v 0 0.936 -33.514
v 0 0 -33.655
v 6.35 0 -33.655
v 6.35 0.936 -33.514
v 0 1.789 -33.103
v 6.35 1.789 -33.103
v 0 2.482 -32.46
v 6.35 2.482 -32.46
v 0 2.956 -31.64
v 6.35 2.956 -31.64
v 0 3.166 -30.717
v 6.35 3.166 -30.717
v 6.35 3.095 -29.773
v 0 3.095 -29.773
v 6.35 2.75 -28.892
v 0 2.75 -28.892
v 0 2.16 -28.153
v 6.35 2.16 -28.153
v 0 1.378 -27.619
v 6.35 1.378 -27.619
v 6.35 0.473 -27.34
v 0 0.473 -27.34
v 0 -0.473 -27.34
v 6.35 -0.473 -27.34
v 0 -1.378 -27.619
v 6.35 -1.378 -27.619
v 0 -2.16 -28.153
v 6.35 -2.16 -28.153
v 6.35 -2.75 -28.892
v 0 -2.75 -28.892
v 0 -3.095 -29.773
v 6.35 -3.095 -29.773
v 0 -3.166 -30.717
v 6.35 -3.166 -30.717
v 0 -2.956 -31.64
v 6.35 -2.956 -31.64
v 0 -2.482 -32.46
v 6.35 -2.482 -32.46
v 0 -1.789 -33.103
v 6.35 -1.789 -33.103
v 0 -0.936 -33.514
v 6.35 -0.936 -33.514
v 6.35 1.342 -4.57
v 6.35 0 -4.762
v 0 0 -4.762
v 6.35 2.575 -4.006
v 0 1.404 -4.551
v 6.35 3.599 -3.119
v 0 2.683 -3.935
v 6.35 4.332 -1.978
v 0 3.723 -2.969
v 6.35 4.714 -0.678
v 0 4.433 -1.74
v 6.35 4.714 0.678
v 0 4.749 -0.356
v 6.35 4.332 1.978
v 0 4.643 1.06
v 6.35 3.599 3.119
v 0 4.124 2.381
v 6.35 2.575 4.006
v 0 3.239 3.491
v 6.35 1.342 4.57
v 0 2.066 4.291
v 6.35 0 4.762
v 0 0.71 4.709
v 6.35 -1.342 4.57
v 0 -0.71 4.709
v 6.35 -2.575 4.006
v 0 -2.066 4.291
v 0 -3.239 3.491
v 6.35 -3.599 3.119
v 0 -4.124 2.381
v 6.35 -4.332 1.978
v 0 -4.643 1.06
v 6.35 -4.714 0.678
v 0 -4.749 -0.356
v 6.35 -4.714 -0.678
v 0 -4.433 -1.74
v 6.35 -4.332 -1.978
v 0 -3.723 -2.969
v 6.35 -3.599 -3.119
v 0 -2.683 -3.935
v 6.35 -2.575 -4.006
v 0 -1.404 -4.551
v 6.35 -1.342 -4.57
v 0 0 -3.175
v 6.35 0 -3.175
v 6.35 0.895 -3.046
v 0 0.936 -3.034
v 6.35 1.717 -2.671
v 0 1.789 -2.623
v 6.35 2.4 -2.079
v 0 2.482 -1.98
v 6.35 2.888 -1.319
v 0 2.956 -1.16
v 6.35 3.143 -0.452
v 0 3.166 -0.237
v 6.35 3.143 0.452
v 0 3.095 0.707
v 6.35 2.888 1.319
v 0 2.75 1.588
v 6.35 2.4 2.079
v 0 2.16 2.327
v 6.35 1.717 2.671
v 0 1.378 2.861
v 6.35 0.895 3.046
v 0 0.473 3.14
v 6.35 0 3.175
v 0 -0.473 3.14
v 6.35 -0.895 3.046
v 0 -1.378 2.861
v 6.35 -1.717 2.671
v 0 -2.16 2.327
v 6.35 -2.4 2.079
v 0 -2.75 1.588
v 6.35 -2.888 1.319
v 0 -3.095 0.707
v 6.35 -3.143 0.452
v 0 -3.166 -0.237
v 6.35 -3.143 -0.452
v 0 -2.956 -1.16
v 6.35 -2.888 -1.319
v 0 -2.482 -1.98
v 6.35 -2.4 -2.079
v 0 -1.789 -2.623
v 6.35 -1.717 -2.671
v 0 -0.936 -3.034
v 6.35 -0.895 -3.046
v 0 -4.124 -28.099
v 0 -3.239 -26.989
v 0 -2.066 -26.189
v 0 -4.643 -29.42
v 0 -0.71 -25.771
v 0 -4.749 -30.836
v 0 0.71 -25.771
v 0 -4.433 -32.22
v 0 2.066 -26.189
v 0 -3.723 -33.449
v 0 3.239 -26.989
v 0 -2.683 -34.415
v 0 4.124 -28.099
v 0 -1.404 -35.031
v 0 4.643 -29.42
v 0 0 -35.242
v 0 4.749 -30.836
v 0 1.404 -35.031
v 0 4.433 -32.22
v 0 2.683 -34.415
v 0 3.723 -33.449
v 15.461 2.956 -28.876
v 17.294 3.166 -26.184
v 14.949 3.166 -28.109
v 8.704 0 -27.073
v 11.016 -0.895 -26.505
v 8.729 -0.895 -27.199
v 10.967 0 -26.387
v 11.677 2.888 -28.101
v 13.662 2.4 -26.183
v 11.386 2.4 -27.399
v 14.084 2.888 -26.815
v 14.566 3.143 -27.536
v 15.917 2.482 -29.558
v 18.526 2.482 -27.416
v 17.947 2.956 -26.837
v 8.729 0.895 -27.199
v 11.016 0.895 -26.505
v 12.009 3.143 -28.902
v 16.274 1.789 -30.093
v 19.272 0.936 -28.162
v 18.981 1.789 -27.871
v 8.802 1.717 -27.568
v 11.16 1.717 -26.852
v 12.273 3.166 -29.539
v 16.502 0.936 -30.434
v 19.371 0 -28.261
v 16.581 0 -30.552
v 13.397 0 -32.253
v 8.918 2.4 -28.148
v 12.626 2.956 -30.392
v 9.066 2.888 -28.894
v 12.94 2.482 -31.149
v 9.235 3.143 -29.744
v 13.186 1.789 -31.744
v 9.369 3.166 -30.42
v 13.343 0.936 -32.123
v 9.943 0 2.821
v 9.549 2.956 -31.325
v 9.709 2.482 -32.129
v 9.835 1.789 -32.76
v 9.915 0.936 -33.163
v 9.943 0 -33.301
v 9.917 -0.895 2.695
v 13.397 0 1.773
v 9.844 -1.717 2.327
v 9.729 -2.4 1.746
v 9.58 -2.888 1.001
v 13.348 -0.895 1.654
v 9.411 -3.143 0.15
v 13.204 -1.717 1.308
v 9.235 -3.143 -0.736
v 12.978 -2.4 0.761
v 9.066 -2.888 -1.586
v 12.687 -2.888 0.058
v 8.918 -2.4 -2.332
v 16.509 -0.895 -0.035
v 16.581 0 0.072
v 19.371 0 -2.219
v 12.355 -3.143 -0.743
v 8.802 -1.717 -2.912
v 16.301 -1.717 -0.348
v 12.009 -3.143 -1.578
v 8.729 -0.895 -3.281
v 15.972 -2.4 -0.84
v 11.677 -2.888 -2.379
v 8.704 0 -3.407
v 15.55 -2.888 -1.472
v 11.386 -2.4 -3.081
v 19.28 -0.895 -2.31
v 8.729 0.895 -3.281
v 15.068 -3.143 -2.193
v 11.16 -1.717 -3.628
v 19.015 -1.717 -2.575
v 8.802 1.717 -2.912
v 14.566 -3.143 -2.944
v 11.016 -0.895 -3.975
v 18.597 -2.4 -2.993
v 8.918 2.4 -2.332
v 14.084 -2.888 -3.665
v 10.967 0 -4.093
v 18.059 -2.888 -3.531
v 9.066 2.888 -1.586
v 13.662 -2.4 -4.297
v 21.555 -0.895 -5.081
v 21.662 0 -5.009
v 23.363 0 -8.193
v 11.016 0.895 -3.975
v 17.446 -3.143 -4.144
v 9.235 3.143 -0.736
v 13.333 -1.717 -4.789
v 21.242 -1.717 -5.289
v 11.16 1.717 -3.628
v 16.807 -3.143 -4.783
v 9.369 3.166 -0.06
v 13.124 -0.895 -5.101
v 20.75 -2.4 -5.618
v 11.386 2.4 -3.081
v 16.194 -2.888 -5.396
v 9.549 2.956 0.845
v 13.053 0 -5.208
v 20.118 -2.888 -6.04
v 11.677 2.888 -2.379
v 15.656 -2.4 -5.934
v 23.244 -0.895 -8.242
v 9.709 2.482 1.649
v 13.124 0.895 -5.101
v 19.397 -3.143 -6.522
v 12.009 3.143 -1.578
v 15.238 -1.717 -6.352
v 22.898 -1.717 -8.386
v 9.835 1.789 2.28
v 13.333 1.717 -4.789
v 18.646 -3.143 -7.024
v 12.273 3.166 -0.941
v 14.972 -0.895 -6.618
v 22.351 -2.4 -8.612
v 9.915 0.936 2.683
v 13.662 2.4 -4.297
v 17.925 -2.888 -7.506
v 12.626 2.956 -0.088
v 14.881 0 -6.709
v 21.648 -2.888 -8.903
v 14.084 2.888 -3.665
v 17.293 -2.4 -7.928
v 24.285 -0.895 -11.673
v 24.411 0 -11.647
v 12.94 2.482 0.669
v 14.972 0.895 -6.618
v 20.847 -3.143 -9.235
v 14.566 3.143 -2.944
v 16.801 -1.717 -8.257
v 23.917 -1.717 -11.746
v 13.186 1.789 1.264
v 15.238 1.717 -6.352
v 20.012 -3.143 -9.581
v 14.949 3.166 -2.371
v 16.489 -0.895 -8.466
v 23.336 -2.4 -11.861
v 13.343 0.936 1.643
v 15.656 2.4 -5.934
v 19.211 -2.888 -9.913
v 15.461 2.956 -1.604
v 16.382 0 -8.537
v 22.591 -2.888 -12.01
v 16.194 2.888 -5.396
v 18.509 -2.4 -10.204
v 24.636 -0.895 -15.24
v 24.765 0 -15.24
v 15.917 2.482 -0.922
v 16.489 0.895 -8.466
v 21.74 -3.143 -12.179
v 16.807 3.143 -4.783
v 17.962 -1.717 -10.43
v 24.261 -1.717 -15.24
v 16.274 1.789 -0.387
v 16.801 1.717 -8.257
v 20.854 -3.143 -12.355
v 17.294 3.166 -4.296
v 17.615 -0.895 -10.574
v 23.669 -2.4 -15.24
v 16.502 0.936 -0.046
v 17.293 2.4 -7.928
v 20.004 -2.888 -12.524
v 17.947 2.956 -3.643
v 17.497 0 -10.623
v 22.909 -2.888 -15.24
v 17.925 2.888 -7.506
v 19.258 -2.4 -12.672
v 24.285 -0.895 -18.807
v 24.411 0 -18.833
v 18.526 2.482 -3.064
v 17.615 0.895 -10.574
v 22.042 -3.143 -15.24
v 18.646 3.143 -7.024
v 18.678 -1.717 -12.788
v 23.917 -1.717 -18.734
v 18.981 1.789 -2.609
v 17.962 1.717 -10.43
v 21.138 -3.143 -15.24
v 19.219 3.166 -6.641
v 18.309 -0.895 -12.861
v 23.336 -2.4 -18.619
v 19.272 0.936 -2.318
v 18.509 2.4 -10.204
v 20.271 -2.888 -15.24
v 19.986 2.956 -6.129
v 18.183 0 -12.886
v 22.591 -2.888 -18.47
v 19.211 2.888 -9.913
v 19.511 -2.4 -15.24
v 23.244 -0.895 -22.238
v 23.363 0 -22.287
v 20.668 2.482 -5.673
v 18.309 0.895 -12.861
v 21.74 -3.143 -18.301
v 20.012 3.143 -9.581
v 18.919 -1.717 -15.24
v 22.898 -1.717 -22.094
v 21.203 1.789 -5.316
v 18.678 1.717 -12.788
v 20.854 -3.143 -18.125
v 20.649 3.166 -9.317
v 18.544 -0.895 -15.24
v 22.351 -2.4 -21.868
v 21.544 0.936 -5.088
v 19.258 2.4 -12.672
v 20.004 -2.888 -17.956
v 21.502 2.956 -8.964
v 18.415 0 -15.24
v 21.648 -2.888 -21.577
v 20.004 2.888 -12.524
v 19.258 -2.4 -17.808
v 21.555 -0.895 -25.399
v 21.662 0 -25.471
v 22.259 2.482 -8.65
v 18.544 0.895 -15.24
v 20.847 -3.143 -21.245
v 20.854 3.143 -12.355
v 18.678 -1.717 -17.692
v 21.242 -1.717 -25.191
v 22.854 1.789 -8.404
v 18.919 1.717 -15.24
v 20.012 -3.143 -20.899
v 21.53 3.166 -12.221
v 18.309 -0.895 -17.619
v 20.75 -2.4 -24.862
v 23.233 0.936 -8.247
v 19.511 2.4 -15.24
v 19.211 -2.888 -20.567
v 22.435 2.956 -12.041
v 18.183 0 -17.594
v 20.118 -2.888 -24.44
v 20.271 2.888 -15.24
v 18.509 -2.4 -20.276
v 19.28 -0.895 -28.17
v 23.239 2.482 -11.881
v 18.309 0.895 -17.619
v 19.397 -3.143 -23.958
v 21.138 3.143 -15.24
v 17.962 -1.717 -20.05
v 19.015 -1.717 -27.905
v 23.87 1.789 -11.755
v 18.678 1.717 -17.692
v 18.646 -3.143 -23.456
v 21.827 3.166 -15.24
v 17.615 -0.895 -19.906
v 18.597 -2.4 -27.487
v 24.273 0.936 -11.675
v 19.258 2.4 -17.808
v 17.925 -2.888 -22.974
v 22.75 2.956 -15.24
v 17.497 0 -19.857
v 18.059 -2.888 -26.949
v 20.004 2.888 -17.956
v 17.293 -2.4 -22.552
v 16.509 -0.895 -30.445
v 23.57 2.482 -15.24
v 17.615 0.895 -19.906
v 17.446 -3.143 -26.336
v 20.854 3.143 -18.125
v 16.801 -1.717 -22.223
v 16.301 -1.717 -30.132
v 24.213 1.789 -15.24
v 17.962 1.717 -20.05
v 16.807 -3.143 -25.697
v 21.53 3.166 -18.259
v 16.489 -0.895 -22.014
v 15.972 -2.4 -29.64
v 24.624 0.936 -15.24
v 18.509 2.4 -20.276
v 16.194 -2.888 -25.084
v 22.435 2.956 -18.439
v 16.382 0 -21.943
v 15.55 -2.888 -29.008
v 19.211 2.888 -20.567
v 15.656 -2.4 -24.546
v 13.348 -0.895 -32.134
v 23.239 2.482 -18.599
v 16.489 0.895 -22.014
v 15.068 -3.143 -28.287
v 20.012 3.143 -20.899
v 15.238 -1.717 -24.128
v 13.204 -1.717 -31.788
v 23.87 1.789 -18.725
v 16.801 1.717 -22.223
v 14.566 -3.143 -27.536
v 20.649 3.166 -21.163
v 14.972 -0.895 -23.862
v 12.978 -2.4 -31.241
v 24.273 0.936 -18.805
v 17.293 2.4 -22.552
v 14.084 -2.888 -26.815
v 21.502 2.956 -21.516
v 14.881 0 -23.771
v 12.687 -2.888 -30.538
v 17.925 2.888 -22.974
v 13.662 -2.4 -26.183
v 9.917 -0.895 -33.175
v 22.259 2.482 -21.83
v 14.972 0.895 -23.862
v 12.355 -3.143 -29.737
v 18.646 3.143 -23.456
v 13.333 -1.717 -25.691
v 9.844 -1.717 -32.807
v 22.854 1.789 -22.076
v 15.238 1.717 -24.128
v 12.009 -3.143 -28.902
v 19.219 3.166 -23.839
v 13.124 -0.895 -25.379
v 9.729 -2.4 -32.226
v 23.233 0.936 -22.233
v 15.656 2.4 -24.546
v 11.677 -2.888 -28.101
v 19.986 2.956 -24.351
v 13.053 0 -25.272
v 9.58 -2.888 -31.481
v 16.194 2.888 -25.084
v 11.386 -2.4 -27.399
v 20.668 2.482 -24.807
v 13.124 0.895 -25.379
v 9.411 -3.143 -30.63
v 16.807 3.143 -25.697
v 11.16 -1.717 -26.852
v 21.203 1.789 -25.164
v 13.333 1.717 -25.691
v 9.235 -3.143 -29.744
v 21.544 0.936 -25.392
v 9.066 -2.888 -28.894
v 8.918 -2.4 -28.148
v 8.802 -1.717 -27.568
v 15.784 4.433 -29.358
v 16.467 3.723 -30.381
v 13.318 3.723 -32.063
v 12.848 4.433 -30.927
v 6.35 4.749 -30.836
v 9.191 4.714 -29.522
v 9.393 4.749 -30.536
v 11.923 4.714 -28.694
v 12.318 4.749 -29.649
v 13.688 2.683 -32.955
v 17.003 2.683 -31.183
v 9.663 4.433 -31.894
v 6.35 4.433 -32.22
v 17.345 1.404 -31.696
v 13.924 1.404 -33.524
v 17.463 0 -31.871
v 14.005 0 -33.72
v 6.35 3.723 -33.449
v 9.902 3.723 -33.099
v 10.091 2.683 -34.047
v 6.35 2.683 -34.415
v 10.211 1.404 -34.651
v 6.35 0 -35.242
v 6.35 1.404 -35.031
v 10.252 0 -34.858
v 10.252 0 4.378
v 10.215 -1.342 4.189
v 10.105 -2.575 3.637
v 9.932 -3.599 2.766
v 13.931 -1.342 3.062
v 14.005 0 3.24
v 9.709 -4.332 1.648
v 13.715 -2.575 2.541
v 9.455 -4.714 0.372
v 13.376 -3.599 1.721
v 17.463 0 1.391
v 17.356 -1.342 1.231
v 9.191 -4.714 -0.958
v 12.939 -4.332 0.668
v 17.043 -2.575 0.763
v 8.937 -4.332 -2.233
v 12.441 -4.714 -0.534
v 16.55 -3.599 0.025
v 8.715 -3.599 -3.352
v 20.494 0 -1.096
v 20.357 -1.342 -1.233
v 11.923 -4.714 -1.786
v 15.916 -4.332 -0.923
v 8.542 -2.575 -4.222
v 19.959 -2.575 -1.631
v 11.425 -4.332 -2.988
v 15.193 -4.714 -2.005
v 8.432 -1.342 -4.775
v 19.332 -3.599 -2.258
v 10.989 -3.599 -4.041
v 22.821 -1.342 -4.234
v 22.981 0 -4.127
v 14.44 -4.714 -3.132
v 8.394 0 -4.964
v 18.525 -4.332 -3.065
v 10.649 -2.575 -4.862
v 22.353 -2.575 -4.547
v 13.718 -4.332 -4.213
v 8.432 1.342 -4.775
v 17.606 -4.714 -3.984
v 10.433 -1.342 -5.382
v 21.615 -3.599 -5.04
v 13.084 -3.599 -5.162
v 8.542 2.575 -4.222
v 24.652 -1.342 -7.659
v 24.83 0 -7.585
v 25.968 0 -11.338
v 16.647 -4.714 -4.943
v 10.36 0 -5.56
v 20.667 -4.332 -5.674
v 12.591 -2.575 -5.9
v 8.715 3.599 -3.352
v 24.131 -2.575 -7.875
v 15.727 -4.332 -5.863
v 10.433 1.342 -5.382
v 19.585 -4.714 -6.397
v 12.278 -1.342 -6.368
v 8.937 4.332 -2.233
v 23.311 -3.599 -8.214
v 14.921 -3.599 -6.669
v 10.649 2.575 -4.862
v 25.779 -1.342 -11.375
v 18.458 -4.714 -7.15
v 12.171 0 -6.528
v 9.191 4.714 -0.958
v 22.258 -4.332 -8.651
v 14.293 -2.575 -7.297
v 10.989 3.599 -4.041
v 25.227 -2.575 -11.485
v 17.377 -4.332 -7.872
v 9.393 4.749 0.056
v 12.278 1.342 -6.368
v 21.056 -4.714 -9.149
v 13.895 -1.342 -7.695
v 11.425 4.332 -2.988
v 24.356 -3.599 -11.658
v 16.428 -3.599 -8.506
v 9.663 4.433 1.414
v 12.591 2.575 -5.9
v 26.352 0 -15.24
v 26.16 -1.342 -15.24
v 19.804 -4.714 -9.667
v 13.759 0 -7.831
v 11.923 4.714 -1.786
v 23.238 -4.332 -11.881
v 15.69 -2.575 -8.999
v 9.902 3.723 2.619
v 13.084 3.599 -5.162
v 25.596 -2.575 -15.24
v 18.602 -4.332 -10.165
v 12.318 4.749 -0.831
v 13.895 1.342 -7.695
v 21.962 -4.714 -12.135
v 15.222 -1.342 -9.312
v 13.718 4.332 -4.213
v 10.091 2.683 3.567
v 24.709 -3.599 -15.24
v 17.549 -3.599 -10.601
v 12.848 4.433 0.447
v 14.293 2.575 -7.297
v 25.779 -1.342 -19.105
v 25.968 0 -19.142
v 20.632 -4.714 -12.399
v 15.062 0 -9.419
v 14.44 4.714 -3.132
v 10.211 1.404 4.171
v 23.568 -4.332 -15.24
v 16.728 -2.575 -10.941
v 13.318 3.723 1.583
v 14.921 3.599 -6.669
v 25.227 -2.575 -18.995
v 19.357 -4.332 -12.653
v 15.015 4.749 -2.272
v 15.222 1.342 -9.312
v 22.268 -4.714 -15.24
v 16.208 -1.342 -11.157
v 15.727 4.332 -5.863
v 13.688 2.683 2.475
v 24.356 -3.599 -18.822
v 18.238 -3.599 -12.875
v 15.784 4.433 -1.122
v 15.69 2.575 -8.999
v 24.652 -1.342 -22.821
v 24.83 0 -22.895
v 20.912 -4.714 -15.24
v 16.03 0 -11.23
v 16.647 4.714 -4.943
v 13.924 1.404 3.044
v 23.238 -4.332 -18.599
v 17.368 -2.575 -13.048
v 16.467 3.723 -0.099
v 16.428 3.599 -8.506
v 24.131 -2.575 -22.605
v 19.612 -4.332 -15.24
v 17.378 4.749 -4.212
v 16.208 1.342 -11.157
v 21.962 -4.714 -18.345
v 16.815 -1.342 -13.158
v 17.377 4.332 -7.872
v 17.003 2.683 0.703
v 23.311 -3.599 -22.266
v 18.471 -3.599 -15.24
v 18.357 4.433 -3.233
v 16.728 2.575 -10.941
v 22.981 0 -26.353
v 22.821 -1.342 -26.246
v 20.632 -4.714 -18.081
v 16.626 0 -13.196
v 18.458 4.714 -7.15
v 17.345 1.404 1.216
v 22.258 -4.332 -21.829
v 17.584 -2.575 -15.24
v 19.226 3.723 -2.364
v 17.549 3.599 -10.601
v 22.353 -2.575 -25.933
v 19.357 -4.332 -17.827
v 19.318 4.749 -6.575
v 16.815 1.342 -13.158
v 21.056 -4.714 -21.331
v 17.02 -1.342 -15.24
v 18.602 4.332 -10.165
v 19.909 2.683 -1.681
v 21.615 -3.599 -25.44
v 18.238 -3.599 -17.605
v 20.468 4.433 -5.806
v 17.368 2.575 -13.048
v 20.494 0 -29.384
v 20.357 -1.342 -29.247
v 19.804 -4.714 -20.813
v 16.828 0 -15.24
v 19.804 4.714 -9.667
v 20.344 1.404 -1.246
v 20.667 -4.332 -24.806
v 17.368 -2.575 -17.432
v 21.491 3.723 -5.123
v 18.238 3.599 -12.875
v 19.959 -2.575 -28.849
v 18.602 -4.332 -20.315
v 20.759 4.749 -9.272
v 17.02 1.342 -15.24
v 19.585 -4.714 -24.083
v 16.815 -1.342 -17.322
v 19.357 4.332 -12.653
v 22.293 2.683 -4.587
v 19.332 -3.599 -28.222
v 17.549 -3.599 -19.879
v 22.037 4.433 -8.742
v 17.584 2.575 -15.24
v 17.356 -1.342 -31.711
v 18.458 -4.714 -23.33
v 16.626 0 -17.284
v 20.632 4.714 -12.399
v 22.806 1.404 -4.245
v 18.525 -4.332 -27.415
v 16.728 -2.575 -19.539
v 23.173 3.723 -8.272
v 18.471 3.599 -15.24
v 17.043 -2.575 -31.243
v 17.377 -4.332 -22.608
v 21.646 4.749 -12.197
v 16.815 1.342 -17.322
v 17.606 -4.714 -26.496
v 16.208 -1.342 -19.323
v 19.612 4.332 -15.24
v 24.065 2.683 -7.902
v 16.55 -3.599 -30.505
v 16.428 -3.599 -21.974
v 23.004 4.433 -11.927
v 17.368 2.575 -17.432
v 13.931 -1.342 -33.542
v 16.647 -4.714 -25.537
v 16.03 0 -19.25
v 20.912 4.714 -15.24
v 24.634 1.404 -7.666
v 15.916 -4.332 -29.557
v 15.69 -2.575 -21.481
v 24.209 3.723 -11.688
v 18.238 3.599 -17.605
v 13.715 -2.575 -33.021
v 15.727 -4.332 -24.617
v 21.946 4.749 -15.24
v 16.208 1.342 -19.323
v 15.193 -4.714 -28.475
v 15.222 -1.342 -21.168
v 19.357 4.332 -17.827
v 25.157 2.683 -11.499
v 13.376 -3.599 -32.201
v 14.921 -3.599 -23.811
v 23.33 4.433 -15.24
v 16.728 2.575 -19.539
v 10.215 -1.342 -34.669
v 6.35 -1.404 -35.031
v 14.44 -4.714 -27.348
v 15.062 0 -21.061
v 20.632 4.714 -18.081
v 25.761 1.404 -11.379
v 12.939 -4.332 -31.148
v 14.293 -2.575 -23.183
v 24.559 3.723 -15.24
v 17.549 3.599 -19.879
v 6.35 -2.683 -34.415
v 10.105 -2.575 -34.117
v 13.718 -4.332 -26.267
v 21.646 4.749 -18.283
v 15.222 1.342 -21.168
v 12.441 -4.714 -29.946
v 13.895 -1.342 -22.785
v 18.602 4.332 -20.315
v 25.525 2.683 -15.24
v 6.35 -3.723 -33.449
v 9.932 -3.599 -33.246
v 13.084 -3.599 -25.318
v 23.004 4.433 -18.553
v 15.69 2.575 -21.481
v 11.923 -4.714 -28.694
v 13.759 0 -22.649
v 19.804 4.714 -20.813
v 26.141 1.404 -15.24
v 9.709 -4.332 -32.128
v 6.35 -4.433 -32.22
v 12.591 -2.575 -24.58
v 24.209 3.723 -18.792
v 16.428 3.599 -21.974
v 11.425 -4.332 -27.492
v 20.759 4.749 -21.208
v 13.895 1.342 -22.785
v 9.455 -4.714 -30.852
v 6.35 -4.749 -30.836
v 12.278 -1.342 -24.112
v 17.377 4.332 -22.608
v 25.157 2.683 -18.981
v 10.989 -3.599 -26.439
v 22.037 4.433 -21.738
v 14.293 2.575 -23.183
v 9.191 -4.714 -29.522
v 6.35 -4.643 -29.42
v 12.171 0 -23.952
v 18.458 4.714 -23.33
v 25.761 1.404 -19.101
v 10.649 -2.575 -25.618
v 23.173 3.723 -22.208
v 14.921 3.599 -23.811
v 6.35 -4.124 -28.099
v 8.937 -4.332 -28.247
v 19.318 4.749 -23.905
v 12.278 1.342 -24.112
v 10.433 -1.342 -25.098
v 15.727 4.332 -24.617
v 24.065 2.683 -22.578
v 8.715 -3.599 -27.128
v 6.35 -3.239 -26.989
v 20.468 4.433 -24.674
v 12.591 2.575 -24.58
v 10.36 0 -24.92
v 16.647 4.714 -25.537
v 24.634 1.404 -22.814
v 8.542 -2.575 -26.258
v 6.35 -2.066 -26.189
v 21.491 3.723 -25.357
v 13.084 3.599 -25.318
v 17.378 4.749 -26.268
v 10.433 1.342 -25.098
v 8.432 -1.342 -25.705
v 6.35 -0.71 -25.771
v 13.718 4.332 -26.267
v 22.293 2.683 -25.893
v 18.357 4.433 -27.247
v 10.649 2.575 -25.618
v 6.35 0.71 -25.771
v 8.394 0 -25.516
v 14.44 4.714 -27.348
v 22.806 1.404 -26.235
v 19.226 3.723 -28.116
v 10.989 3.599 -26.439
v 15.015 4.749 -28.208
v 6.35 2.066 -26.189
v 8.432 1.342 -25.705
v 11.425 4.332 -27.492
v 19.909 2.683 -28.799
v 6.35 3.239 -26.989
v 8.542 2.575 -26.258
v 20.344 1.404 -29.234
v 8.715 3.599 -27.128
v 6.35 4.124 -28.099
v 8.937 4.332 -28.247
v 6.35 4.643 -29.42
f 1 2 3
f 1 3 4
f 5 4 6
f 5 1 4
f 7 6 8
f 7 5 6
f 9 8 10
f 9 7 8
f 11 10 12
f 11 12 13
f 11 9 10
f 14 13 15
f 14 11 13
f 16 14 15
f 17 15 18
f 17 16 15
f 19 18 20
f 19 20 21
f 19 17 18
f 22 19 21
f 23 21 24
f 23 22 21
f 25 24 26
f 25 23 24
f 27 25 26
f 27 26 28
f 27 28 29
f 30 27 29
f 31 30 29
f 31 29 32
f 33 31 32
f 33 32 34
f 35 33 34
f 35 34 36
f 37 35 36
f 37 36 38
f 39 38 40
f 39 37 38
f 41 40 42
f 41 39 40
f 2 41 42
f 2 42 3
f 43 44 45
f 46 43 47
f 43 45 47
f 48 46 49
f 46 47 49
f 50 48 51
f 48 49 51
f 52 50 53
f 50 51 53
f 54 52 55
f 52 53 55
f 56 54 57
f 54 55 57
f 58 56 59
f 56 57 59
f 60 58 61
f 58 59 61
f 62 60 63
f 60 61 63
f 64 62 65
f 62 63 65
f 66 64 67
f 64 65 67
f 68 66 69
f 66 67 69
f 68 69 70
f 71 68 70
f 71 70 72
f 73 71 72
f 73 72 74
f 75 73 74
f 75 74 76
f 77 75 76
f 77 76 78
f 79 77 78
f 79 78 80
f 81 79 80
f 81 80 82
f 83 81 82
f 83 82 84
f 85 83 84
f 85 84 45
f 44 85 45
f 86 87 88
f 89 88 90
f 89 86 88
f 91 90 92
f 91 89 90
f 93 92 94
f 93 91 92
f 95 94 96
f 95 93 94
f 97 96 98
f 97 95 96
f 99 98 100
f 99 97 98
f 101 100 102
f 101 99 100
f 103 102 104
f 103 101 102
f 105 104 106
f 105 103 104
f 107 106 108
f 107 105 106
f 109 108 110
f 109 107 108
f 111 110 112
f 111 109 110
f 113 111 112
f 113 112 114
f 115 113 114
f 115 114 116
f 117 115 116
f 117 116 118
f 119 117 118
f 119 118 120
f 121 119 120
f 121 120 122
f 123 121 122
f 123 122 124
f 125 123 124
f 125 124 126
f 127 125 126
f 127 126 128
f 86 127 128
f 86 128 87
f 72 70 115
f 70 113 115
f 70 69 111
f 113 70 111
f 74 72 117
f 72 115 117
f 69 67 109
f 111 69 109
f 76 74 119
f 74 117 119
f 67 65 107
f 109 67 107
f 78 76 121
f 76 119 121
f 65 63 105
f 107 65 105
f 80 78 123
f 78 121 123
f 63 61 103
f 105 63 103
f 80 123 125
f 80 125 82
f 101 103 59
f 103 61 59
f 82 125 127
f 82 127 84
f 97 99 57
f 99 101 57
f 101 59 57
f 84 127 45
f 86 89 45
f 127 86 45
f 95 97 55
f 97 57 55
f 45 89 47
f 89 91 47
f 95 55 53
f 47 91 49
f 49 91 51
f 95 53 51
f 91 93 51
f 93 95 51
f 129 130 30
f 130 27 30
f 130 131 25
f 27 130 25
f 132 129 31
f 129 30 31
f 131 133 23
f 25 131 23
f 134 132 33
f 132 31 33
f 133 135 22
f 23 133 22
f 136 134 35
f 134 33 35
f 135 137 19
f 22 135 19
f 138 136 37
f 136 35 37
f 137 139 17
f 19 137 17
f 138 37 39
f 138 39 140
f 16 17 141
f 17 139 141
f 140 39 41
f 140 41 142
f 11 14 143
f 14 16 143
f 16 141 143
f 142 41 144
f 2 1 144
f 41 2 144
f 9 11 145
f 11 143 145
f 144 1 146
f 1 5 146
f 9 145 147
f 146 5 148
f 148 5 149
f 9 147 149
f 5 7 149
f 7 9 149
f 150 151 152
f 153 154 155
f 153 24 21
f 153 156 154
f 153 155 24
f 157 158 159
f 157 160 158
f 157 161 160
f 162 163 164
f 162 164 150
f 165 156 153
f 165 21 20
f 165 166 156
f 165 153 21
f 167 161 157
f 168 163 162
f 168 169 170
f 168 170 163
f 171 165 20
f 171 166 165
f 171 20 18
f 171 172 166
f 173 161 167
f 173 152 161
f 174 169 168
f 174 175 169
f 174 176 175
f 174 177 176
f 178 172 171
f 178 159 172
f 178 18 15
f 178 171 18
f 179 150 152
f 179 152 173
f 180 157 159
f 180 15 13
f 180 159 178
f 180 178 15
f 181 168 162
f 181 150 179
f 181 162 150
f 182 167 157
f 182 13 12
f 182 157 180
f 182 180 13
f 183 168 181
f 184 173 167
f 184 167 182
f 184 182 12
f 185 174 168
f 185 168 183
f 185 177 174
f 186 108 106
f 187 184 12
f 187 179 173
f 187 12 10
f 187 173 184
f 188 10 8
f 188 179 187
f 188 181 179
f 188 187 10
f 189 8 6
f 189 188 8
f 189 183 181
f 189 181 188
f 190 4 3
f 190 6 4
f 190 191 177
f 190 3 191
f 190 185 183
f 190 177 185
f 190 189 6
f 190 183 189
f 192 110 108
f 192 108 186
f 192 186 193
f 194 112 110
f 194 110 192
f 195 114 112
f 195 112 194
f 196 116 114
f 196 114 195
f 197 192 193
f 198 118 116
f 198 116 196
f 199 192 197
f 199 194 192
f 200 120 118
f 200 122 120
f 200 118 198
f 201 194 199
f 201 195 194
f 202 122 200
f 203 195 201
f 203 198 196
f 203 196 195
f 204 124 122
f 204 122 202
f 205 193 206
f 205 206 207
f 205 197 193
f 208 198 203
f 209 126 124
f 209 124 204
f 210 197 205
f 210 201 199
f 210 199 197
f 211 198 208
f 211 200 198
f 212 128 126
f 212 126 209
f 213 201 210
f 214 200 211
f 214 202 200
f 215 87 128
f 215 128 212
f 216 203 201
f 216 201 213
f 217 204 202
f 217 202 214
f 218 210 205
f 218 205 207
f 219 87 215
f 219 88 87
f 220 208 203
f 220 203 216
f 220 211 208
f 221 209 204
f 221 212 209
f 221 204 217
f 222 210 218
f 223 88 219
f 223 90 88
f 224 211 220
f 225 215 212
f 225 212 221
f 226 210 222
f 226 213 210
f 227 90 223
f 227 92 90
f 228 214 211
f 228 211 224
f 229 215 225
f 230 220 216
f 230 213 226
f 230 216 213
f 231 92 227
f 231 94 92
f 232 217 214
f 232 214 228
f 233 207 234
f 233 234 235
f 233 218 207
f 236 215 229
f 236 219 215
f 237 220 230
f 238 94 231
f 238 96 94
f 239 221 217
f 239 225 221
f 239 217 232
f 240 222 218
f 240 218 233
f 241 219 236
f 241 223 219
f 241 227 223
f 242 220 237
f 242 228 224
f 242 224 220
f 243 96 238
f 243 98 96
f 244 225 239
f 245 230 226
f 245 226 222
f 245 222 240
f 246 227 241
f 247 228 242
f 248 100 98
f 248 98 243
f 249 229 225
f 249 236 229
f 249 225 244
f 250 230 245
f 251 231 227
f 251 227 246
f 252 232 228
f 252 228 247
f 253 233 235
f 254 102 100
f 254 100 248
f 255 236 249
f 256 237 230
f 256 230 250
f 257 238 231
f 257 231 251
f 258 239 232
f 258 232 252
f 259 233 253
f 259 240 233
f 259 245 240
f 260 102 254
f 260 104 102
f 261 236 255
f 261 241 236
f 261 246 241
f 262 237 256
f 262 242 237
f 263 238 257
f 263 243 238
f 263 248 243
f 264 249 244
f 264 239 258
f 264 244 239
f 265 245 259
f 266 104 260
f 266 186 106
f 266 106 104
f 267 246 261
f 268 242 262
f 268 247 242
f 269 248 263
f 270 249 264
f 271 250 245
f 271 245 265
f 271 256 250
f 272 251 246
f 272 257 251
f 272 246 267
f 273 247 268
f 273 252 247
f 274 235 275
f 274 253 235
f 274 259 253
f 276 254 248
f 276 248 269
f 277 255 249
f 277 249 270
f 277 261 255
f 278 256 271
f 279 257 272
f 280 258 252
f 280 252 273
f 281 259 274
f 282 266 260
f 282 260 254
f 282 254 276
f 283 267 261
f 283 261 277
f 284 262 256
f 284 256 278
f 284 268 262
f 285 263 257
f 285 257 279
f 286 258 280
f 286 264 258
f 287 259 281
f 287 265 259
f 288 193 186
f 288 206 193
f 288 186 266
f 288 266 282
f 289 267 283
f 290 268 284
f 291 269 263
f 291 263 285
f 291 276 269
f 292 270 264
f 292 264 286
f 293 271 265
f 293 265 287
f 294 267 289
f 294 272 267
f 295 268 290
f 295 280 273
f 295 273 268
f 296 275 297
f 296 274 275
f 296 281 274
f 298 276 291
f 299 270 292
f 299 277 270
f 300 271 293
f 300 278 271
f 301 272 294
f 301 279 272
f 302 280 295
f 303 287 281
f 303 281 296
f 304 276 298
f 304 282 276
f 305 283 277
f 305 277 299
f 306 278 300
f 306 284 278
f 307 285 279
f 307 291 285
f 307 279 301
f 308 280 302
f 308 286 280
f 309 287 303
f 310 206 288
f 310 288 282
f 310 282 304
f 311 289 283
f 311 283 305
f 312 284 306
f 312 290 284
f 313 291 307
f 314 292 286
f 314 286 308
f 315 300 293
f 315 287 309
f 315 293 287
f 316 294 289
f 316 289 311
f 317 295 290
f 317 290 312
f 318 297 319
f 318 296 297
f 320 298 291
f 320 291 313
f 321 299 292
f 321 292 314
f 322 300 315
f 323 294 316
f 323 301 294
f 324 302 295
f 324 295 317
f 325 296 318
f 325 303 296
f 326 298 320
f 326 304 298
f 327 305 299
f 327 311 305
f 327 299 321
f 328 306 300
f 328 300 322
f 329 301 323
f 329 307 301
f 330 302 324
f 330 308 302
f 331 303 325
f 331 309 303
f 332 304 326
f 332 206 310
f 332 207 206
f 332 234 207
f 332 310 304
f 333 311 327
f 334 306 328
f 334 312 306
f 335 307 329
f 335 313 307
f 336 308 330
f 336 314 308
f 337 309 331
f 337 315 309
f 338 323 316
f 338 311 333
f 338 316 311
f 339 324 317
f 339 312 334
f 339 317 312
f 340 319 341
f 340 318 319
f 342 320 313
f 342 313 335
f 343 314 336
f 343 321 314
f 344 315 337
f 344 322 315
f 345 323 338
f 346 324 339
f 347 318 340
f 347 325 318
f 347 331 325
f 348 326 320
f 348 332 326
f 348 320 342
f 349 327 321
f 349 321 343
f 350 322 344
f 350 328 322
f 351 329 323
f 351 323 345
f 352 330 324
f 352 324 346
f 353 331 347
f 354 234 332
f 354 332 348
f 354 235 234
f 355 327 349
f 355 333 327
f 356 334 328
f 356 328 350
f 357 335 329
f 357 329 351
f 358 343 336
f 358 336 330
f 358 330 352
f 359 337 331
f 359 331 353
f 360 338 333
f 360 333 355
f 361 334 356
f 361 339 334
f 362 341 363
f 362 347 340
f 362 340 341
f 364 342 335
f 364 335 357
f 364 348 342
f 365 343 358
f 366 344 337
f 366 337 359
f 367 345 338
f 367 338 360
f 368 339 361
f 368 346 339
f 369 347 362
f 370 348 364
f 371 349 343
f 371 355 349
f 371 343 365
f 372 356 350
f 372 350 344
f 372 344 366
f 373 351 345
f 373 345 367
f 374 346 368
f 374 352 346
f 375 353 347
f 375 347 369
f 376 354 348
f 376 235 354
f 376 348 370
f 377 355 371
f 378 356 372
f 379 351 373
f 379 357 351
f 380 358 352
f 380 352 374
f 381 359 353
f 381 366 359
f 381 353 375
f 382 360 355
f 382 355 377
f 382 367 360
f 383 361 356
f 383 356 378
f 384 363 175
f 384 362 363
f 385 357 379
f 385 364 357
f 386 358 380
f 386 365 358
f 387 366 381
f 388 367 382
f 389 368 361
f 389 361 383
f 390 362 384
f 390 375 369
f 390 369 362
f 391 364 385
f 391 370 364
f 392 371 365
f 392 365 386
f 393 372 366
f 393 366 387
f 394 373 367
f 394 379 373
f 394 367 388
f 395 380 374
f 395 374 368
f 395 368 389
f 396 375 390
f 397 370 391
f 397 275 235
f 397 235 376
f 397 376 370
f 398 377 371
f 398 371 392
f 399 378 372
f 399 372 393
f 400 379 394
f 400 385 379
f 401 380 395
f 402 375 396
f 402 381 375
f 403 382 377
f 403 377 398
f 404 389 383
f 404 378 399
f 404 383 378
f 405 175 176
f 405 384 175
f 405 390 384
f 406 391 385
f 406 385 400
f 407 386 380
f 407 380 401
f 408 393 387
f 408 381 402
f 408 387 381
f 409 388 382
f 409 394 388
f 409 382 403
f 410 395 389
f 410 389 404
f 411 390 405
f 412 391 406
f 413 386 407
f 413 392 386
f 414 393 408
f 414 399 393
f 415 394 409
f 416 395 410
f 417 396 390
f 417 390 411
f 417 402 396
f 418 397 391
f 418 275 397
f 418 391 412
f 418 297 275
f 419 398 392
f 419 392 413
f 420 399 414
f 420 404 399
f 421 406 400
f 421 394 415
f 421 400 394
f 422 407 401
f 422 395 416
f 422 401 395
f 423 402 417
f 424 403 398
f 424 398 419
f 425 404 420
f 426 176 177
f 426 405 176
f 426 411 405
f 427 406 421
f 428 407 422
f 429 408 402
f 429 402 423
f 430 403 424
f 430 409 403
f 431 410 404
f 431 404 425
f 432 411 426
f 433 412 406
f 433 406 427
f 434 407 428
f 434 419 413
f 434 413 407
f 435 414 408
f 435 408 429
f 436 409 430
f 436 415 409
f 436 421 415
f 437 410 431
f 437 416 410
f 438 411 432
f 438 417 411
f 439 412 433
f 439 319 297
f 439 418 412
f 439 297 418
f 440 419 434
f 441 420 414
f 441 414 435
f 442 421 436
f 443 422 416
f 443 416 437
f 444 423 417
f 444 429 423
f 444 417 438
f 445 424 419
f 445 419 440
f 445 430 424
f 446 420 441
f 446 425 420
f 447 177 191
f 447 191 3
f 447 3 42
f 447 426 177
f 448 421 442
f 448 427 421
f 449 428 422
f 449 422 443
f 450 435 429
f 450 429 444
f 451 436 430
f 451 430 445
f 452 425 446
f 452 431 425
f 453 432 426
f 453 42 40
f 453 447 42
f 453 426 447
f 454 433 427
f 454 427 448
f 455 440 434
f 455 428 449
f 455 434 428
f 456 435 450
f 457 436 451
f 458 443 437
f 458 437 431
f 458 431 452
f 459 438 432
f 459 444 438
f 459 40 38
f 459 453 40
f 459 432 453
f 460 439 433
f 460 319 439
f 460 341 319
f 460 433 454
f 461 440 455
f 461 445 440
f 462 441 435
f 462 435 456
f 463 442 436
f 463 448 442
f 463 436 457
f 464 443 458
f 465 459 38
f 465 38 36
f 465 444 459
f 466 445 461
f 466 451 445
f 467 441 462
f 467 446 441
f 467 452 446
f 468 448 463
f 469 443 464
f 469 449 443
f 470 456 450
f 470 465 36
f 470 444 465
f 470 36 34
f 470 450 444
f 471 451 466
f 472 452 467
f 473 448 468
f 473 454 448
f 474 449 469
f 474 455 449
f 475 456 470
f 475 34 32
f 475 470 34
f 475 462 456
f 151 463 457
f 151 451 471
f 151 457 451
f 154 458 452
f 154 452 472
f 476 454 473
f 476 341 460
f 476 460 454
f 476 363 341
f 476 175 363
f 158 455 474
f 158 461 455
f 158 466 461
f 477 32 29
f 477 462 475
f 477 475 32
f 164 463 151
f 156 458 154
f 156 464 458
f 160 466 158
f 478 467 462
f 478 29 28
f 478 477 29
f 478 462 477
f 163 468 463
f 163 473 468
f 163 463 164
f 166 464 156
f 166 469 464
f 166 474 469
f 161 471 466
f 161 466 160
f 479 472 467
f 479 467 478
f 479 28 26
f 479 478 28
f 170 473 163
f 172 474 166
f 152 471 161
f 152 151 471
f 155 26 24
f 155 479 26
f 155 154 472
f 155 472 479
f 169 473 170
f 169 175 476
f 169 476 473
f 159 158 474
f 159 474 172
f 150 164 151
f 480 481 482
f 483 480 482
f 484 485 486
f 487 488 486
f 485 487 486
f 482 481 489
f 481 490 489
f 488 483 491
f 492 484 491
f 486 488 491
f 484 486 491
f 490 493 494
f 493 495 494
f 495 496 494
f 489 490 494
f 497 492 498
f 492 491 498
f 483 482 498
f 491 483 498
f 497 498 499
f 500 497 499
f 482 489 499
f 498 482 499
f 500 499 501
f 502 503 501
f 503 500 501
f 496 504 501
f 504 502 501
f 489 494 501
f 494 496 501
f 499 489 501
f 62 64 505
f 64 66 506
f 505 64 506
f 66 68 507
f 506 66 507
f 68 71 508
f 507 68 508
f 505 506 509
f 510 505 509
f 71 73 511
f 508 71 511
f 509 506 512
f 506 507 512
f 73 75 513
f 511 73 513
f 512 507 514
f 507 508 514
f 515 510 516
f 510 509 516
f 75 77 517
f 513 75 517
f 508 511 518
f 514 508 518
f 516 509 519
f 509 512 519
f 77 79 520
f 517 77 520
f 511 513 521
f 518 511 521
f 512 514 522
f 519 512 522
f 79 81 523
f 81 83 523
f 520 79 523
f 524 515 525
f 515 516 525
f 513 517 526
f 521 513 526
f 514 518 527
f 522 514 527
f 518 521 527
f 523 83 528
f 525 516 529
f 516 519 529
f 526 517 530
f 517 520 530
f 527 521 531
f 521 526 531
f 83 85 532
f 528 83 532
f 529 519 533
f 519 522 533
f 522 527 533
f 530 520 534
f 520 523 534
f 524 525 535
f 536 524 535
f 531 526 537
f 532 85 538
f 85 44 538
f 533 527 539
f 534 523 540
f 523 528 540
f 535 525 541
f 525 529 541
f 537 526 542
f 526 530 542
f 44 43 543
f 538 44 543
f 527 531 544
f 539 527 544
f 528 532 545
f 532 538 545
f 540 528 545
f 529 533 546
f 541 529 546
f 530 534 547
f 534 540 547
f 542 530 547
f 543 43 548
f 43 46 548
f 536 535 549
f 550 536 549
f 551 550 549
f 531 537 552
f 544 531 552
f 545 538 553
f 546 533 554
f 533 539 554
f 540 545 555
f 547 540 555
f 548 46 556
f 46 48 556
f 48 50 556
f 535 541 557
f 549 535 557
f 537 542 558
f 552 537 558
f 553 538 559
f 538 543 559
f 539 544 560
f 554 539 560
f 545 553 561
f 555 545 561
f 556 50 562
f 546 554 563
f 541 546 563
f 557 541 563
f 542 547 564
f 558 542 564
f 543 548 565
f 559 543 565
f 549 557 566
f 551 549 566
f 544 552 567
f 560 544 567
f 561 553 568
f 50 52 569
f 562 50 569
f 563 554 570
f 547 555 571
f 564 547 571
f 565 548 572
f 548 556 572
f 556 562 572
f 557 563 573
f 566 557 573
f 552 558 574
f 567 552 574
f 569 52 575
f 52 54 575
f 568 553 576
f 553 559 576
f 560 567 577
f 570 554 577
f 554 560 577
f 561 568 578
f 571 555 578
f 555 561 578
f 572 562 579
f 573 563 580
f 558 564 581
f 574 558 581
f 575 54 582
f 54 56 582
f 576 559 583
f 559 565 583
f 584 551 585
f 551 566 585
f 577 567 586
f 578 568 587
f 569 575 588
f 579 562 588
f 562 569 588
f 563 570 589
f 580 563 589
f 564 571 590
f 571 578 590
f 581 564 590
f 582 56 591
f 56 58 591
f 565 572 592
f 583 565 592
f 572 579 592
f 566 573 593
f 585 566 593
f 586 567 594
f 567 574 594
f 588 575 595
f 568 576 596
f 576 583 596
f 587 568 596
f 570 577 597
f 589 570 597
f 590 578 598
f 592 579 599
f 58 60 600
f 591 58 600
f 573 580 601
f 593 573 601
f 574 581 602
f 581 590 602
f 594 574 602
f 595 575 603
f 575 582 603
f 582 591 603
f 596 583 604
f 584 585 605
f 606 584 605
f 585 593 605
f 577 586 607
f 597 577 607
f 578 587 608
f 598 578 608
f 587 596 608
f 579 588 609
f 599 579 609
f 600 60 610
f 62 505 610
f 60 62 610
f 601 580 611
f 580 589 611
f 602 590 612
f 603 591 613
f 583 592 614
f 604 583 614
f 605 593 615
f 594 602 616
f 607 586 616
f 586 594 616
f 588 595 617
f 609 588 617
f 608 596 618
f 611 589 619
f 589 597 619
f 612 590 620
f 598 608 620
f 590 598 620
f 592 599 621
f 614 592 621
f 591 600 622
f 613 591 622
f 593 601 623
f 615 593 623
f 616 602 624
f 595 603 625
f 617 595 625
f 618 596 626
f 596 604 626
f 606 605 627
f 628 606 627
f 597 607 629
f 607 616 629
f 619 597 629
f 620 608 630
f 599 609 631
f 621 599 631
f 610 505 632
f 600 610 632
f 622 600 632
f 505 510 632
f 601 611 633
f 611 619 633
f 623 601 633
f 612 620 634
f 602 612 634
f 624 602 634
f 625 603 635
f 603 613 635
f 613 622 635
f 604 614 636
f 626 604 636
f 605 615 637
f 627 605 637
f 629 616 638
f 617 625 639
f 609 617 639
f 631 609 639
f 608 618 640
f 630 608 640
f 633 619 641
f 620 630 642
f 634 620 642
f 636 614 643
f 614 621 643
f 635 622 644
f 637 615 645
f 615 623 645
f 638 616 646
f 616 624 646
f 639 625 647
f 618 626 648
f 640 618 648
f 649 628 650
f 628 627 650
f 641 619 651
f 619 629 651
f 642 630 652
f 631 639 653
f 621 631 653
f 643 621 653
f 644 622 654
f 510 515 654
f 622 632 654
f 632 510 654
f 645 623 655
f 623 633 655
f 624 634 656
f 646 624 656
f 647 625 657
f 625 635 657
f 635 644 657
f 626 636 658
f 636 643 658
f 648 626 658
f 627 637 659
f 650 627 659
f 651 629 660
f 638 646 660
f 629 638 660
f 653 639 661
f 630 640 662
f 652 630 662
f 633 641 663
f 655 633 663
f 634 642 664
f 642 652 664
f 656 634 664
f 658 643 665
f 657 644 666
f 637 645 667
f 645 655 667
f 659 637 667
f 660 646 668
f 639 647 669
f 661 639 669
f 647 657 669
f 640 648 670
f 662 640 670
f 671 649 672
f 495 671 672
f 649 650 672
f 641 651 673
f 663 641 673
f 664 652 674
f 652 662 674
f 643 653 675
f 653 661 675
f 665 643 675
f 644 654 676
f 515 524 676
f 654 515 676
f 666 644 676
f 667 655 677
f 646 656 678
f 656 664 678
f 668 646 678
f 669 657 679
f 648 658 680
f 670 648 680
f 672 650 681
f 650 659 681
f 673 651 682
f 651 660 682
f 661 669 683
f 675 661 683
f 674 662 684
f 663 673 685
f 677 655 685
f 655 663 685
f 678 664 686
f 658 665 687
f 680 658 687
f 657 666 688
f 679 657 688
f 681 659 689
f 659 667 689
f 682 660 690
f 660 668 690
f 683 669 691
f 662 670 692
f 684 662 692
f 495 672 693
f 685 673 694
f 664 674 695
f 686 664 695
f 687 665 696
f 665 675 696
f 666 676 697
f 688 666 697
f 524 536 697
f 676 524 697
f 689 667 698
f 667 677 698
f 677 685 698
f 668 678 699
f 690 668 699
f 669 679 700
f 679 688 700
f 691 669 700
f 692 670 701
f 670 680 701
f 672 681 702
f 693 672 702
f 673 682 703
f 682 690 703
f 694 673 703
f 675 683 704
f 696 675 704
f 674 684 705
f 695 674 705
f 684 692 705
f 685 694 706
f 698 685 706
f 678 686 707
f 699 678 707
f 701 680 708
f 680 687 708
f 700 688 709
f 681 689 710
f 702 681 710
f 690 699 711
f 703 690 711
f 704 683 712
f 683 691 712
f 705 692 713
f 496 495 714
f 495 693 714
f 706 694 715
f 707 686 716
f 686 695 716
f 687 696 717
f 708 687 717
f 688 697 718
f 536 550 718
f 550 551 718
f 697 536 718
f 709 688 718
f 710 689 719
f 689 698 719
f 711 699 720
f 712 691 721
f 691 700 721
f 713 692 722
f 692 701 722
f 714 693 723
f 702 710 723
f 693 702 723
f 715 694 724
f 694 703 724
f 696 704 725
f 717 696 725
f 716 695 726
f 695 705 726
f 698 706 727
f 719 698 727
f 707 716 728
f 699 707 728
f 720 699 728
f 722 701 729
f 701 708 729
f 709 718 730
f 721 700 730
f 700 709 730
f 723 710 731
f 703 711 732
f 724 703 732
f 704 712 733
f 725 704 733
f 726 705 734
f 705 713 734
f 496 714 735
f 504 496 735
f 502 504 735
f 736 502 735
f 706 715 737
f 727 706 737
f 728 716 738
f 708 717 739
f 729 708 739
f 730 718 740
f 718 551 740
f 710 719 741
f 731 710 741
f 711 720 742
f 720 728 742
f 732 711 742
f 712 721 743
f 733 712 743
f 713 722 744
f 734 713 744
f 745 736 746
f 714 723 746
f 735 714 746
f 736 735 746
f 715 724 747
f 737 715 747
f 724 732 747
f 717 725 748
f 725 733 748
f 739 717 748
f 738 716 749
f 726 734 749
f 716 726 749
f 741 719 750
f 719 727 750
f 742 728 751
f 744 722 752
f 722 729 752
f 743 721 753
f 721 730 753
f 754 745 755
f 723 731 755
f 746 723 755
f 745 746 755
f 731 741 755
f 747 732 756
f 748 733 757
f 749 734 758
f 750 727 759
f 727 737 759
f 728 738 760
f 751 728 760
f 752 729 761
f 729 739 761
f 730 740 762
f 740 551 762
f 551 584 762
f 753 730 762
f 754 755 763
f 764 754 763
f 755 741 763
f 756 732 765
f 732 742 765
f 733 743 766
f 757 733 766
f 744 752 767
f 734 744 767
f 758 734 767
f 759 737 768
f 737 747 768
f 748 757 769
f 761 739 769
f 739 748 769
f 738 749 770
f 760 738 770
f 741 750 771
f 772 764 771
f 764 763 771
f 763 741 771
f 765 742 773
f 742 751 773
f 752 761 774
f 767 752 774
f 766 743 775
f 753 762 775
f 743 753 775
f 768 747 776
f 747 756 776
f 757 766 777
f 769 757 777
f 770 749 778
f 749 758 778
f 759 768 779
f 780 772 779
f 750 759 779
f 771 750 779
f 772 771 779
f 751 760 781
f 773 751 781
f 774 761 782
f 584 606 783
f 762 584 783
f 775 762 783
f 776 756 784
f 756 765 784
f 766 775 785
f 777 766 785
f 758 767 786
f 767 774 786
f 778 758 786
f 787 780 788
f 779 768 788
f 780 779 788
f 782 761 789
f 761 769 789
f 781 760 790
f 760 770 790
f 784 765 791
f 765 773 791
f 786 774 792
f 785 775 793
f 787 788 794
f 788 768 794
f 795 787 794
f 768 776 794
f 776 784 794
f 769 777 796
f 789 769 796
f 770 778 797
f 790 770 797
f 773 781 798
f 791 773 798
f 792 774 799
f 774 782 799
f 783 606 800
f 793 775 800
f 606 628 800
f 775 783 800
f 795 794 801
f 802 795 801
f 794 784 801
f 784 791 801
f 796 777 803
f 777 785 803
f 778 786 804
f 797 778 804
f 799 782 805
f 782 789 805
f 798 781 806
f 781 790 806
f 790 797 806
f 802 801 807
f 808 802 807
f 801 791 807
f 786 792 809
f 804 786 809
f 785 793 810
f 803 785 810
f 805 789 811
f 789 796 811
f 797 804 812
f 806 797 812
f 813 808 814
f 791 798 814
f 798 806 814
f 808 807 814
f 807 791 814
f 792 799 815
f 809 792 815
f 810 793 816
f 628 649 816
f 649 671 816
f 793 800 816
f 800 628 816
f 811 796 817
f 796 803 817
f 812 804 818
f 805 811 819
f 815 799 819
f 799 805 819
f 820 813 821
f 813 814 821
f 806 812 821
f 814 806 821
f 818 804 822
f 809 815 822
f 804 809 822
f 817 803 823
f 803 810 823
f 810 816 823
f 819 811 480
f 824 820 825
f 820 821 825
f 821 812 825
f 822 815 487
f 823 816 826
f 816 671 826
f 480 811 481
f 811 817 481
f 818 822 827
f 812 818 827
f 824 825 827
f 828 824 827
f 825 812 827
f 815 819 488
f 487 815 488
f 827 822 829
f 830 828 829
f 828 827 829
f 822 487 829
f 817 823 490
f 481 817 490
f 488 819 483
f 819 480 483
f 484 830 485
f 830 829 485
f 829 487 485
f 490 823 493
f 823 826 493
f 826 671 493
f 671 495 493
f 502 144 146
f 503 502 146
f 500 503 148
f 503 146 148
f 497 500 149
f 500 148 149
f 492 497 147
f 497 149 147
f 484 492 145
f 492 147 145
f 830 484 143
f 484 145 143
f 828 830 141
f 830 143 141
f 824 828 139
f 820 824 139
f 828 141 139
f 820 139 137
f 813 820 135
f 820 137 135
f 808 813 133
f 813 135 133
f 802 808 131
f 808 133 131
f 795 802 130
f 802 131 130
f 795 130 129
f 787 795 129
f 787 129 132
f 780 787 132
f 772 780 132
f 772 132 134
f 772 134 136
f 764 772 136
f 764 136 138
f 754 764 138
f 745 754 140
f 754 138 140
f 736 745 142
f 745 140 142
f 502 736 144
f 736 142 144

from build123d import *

# Parameters (mm, degrees)
SKETCH1_R             = 4.7625
SKETCH1_R_2           = 3.175
BOSS_EXTRUDE1_DEPTH   = 6.35
BOSS_EXTRUDE1_2_DEPTH = 6.35
SKETCH2_R             = 4.7625
SKETCH2_R_2           = 3.175
REVOLVE1_ANGLE        = 180


with BuildPart() as part:
    # Sketch1 → Boss-Extrude1 (new body)
    with BuildSketch(Plane(origin=(0, 0, 0), x_dir=(0, 0, -1), z_dir=(1, 0, 0))):
        Circle(SKETCH1_R)
        Circle(SKETCH1_R_2, mode=Mode.SUBTRACT)
    extrude(amount=BOSS_EXTRUDE1_DEPTH)



with BuildPart() as body_2:
    # Sketch1 → Boss-Extrude1 2 (new body)
    with BuildSketch(Plane(origin=(0, 0, 0), x_dir=(0, 0, -1), z_dir=(1, 0, 0))):
        with Locations((30.48, 0)):
            Circle(SKETCH1_R)
        with Locations((30.48, 0)):
            Circle(SKETCH1_R_2, mode=Mode.SUBTRACT)
    extrude(amount=BOSS_EXTRUDE1_2_DEPTH)


with BuildPart() as part_1:
    add(part.part)

    add(body_2.part)  # Revolve1 merges body 2
    # Sketch2 → Revolve1 (revolve)
    with BuildSketch(Plane(origin=(6.35, 0, 0), x_dir=(0, 0, -1), z_dir=(1, 0, 0))):
        with Locations(Location((0, 0, 0), (0, 0, 180))):
            Circle(SKETCH2_R)
        with Locations(Location((0, 0, 0), (0, 0, 180))):
            Circle(SKETCH2_R_2, mode=Mode.SUBTRACT)
    revolve(axis=Axis((6.35, 0, -15.24), (0, 1, 0)), revolution_arc=REVOLVE1_ANGLE)


solid = part_1.part
